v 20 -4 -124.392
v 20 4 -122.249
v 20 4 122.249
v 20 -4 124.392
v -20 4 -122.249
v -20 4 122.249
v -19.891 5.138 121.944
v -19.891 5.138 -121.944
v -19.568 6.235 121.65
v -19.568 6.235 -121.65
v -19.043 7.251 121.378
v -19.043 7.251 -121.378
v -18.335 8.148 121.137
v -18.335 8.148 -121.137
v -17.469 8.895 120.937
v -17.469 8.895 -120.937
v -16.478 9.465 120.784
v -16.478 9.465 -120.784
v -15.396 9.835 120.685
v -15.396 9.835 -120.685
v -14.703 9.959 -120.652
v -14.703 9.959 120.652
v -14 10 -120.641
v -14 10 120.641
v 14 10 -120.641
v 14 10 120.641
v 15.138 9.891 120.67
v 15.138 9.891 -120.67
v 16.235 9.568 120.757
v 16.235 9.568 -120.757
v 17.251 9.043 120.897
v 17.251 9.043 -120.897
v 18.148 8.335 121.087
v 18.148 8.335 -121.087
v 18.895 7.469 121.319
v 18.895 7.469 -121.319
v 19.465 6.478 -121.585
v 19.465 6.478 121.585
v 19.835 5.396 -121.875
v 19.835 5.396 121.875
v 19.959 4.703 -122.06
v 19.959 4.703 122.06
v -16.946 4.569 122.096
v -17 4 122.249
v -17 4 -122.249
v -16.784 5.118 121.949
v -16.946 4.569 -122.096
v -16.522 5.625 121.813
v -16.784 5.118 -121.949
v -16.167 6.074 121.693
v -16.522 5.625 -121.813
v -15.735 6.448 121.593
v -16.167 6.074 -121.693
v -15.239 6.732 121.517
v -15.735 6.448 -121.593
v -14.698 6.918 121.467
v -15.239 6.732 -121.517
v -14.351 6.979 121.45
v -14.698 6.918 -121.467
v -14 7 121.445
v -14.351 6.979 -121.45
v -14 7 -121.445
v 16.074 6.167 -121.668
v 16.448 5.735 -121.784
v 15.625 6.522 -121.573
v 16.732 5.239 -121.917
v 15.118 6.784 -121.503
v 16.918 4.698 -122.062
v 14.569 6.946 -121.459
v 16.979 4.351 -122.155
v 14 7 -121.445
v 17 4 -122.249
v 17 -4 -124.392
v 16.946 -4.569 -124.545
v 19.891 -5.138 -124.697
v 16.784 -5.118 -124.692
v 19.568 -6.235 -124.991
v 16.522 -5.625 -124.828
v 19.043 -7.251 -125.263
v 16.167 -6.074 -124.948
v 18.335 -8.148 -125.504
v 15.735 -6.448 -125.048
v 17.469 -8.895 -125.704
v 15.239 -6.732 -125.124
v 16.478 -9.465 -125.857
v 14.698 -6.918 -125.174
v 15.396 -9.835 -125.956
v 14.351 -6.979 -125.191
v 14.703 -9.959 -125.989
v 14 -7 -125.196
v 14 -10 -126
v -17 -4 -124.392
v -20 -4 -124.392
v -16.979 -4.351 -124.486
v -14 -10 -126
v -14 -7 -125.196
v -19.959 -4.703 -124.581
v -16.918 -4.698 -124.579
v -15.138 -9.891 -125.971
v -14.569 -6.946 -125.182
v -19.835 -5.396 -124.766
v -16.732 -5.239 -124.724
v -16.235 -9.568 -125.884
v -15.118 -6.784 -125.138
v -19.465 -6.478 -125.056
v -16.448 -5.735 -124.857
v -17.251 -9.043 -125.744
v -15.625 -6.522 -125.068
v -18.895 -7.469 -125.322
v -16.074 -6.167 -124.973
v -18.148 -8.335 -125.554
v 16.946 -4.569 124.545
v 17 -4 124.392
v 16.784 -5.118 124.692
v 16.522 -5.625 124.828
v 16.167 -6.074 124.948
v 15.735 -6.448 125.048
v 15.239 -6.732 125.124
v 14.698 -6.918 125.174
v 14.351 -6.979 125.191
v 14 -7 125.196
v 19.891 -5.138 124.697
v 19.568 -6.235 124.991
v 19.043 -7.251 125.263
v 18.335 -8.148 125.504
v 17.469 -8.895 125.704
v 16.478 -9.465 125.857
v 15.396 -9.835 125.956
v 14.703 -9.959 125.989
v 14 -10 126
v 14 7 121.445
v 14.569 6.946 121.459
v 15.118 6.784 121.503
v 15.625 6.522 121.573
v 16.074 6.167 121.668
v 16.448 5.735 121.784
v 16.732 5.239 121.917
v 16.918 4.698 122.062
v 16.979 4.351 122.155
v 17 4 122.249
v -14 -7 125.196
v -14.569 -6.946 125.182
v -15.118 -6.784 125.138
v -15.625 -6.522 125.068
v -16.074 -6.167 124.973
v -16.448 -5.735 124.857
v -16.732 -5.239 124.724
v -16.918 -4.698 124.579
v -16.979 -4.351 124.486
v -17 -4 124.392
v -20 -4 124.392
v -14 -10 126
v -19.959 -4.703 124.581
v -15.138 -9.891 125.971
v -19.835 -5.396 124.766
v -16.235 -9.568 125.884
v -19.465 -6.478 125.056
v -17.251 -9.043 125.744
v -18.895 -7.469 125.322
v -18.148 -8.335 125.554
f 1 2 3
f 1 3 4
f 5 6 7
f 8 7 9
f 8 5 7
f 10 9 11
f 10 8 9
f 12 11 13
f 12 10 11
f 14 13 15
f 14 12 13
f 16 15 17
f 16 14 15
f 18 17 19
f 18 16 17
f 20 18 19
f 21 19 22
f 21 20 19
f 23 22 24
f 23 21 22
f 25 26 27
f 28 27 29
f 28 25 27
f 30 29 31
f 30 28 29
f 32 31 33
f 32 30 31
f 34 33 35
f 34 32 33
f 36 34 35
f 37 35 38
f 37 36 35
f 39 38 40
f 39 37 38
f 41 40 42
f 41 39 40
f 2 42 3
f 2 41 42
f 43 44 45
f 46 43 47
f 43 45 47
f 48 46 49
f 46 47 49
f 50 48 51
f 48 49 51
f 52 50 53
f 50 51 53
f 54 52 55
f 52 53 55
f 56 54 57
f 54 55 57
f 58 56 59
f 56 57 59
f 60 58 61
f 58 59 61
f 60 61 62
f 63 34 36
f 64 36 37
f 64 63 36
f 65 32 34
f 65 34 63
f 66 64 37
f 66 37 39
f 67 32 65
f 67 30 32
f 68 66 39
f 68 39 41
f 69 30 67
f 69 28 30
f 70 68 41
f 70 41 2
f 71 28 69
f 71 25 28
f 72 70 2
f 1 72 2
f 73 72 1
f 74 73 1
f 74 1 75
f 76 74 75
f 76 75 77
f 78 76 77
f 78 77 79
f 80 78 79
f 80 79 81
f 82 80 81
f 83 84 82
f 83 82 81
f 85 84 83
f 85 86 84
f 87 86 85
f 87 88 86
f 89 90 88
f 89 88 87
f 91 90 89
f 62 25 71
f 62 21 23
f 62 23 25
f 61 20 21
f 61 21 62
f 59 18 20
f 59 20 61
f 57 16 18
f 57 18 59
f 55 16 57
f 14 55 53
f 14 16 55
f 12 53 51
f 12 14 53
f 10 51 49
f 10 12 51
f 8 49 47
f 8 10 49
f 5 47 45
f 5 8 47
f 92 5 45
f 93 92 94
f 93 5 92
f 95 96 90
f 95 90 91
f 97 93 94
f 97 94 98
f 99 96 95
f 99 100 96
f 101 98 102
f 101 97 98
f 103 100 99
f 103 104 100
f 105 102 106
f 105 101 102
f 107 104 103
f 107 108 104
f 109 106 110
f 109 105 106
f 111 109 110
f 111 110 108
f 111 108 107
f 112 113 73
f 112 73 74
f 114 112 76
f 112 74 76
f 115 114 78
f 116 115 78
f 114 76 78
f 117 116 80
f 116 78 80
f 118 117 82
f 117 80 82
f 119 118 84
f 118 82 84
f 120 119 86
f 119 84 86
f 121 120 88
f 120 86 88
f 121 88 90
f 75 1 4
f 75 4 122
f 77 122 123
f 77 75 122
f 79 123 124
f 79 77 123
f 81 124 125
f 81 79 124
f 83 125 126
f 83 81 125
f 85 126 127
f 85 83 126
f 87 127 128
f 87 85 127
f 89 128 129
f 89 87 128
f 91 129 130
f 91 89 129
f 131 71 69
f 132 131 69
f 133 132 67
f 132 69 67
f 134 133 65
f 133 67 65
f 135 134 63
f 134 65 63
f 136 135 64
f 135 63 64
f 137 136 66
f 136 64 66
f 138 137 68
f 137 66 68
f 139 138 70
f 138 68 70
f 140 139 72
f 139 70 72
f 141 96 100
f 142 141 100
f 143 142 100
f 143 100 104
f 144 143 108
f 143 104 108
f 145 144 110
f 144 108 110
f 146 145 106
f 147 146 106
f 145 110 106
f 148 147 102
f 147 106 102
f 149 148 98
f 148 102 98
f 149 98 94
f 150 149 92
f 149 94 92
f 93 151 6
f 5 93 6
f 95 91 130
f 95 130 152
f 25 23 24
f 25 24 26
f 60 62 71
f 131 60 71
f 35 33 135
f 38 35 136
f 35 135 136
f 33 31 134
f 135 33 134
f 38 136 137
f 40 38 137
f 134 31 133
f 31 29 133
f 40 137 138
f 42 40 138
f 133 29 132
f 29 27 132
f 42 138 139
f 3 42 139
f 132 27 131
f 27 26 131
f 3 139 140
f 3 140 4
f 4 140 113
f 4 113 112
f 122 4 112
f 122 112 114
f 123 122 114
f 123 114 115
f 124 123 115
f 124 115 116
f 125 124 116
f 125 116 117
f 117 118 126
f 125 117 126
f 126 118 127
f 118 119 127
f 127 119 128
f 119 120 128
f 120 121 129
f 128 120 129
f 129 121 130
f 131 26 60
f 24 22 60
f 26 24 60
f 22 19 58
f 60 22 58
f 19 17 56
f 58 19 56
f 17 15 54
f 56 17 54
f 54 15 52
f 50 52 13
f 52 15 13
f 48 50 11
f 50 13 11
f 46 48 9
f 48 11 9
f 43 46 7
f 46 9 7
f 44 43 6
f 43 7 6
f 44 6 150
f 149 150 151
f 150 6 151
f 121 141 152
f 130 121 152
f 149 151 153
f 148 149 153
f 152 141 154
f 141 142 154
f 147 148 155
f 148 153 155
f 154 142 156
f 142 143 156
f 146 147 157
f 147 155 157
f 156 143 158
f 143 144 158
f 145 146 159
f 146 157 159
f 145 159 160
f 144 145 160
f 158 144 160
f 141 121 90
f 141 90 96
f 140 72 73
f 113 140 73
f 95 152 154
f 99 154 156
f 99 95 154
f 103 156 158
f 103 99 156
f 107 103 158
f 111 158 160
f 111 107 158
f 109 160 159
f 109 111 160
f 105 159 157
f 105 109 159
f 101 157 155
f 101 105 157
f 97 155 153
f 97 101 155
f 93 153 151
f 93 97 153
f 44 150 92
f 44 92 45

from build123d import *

# Parameters (mm, degrees)
EXTRUDE_1_DEPTH      = 126
EXTRUDE_1_DEPTH_BACK = 126
SHELL_1_T            = -3
CHAMFER_1_SIZE       = 5.358983849
CHAMFER_1_SIZE_2     = 20


with BuildPart() as part:
    # Эскиз1 → Бобышка-Вытянуть1 (new, two sides: drawn at the far end of the back side and taken through both)
    with BuildSketch(Plane.XY.offset(-EXTRUDE_1_DEPTH_BACK)):
        with BuildLine():
            Line((-14, 10), (14, 10))
            ThreePointArc((14, 10), (18.242640687, 8.242640687), (20, 4))
            Line((20, 4), (20, -4))
            ThreePointArc((20, -4), (18.242640687, -8.242640687), (14, -10))
            Line((14, -10), (-14, -10))
            ThreePointArc((-14, -10), (-18.242640687, -8.242640687), (-20, -4))
            Line((-20, -4), (-20, 4))
            ThreePointArc((-20, 4), (-18.242640687, 8.242640687), (-14, 10))
        make_face()
    extrude(amount=EXTRUDE_1_DEPTH + EXTRUDE_1_DEPTH_BACK)

    # Оболочка1
    shell_1_openings = [part.faces().sort_by_distance(p)[0] for p in [
        (0, 0, -126),
        (0, 0, 126),
    ]]
    offset(amount=SHELL_1_T, openings=shell_1_openings, kind=Kind.INTERSECTION)

    # Фаска1
    # the kernel refuses this chamfer: 20, 5.358983849 mm, written as the material it takes off along each edge
    with BuildSketch(Plane(origin=(-65.934431404, 10, -126), x_dir=(0, 0.13751244702128945, 0.9905000388259543), z_dir=(1, 0, 0))) as chamfer_1_piece_1:
        Polygon((CHAMFER_1_SIZE * 0.990500038756, CHAMFER_1_SIZE * 0.137512447012), (-CHAMFER_1_SIZE_2 * 0.137512447021, CHAMFER_1_SIZE_2 * 0.990500038826), (0, 0), align=None)
    extrude(amount=131.868862808, mode=Mode.SUBTRACT)
    with BuildSketch(Plane(origin=(-65.934431404, 10, 126), x_dir=(0, 0.13751244702128945, -0.9905000388259543), z_dir=(1, 0, 0))) as chamfer_1_piece_2:
        Polygon((CHAMFER_1_SIZE * 0.990500038756, -CHAMFER_1_SIZE * 0.137512447012), (-CHAMFER_1_SIZE_2 * 0.137512447021, -CHAMFER_1_SIZE_2 * 0.990500038826), (0, 0), align=None)
    extrude(amount=131.868862808, mode=Mode.SUBTRACT)


solid = part.part
